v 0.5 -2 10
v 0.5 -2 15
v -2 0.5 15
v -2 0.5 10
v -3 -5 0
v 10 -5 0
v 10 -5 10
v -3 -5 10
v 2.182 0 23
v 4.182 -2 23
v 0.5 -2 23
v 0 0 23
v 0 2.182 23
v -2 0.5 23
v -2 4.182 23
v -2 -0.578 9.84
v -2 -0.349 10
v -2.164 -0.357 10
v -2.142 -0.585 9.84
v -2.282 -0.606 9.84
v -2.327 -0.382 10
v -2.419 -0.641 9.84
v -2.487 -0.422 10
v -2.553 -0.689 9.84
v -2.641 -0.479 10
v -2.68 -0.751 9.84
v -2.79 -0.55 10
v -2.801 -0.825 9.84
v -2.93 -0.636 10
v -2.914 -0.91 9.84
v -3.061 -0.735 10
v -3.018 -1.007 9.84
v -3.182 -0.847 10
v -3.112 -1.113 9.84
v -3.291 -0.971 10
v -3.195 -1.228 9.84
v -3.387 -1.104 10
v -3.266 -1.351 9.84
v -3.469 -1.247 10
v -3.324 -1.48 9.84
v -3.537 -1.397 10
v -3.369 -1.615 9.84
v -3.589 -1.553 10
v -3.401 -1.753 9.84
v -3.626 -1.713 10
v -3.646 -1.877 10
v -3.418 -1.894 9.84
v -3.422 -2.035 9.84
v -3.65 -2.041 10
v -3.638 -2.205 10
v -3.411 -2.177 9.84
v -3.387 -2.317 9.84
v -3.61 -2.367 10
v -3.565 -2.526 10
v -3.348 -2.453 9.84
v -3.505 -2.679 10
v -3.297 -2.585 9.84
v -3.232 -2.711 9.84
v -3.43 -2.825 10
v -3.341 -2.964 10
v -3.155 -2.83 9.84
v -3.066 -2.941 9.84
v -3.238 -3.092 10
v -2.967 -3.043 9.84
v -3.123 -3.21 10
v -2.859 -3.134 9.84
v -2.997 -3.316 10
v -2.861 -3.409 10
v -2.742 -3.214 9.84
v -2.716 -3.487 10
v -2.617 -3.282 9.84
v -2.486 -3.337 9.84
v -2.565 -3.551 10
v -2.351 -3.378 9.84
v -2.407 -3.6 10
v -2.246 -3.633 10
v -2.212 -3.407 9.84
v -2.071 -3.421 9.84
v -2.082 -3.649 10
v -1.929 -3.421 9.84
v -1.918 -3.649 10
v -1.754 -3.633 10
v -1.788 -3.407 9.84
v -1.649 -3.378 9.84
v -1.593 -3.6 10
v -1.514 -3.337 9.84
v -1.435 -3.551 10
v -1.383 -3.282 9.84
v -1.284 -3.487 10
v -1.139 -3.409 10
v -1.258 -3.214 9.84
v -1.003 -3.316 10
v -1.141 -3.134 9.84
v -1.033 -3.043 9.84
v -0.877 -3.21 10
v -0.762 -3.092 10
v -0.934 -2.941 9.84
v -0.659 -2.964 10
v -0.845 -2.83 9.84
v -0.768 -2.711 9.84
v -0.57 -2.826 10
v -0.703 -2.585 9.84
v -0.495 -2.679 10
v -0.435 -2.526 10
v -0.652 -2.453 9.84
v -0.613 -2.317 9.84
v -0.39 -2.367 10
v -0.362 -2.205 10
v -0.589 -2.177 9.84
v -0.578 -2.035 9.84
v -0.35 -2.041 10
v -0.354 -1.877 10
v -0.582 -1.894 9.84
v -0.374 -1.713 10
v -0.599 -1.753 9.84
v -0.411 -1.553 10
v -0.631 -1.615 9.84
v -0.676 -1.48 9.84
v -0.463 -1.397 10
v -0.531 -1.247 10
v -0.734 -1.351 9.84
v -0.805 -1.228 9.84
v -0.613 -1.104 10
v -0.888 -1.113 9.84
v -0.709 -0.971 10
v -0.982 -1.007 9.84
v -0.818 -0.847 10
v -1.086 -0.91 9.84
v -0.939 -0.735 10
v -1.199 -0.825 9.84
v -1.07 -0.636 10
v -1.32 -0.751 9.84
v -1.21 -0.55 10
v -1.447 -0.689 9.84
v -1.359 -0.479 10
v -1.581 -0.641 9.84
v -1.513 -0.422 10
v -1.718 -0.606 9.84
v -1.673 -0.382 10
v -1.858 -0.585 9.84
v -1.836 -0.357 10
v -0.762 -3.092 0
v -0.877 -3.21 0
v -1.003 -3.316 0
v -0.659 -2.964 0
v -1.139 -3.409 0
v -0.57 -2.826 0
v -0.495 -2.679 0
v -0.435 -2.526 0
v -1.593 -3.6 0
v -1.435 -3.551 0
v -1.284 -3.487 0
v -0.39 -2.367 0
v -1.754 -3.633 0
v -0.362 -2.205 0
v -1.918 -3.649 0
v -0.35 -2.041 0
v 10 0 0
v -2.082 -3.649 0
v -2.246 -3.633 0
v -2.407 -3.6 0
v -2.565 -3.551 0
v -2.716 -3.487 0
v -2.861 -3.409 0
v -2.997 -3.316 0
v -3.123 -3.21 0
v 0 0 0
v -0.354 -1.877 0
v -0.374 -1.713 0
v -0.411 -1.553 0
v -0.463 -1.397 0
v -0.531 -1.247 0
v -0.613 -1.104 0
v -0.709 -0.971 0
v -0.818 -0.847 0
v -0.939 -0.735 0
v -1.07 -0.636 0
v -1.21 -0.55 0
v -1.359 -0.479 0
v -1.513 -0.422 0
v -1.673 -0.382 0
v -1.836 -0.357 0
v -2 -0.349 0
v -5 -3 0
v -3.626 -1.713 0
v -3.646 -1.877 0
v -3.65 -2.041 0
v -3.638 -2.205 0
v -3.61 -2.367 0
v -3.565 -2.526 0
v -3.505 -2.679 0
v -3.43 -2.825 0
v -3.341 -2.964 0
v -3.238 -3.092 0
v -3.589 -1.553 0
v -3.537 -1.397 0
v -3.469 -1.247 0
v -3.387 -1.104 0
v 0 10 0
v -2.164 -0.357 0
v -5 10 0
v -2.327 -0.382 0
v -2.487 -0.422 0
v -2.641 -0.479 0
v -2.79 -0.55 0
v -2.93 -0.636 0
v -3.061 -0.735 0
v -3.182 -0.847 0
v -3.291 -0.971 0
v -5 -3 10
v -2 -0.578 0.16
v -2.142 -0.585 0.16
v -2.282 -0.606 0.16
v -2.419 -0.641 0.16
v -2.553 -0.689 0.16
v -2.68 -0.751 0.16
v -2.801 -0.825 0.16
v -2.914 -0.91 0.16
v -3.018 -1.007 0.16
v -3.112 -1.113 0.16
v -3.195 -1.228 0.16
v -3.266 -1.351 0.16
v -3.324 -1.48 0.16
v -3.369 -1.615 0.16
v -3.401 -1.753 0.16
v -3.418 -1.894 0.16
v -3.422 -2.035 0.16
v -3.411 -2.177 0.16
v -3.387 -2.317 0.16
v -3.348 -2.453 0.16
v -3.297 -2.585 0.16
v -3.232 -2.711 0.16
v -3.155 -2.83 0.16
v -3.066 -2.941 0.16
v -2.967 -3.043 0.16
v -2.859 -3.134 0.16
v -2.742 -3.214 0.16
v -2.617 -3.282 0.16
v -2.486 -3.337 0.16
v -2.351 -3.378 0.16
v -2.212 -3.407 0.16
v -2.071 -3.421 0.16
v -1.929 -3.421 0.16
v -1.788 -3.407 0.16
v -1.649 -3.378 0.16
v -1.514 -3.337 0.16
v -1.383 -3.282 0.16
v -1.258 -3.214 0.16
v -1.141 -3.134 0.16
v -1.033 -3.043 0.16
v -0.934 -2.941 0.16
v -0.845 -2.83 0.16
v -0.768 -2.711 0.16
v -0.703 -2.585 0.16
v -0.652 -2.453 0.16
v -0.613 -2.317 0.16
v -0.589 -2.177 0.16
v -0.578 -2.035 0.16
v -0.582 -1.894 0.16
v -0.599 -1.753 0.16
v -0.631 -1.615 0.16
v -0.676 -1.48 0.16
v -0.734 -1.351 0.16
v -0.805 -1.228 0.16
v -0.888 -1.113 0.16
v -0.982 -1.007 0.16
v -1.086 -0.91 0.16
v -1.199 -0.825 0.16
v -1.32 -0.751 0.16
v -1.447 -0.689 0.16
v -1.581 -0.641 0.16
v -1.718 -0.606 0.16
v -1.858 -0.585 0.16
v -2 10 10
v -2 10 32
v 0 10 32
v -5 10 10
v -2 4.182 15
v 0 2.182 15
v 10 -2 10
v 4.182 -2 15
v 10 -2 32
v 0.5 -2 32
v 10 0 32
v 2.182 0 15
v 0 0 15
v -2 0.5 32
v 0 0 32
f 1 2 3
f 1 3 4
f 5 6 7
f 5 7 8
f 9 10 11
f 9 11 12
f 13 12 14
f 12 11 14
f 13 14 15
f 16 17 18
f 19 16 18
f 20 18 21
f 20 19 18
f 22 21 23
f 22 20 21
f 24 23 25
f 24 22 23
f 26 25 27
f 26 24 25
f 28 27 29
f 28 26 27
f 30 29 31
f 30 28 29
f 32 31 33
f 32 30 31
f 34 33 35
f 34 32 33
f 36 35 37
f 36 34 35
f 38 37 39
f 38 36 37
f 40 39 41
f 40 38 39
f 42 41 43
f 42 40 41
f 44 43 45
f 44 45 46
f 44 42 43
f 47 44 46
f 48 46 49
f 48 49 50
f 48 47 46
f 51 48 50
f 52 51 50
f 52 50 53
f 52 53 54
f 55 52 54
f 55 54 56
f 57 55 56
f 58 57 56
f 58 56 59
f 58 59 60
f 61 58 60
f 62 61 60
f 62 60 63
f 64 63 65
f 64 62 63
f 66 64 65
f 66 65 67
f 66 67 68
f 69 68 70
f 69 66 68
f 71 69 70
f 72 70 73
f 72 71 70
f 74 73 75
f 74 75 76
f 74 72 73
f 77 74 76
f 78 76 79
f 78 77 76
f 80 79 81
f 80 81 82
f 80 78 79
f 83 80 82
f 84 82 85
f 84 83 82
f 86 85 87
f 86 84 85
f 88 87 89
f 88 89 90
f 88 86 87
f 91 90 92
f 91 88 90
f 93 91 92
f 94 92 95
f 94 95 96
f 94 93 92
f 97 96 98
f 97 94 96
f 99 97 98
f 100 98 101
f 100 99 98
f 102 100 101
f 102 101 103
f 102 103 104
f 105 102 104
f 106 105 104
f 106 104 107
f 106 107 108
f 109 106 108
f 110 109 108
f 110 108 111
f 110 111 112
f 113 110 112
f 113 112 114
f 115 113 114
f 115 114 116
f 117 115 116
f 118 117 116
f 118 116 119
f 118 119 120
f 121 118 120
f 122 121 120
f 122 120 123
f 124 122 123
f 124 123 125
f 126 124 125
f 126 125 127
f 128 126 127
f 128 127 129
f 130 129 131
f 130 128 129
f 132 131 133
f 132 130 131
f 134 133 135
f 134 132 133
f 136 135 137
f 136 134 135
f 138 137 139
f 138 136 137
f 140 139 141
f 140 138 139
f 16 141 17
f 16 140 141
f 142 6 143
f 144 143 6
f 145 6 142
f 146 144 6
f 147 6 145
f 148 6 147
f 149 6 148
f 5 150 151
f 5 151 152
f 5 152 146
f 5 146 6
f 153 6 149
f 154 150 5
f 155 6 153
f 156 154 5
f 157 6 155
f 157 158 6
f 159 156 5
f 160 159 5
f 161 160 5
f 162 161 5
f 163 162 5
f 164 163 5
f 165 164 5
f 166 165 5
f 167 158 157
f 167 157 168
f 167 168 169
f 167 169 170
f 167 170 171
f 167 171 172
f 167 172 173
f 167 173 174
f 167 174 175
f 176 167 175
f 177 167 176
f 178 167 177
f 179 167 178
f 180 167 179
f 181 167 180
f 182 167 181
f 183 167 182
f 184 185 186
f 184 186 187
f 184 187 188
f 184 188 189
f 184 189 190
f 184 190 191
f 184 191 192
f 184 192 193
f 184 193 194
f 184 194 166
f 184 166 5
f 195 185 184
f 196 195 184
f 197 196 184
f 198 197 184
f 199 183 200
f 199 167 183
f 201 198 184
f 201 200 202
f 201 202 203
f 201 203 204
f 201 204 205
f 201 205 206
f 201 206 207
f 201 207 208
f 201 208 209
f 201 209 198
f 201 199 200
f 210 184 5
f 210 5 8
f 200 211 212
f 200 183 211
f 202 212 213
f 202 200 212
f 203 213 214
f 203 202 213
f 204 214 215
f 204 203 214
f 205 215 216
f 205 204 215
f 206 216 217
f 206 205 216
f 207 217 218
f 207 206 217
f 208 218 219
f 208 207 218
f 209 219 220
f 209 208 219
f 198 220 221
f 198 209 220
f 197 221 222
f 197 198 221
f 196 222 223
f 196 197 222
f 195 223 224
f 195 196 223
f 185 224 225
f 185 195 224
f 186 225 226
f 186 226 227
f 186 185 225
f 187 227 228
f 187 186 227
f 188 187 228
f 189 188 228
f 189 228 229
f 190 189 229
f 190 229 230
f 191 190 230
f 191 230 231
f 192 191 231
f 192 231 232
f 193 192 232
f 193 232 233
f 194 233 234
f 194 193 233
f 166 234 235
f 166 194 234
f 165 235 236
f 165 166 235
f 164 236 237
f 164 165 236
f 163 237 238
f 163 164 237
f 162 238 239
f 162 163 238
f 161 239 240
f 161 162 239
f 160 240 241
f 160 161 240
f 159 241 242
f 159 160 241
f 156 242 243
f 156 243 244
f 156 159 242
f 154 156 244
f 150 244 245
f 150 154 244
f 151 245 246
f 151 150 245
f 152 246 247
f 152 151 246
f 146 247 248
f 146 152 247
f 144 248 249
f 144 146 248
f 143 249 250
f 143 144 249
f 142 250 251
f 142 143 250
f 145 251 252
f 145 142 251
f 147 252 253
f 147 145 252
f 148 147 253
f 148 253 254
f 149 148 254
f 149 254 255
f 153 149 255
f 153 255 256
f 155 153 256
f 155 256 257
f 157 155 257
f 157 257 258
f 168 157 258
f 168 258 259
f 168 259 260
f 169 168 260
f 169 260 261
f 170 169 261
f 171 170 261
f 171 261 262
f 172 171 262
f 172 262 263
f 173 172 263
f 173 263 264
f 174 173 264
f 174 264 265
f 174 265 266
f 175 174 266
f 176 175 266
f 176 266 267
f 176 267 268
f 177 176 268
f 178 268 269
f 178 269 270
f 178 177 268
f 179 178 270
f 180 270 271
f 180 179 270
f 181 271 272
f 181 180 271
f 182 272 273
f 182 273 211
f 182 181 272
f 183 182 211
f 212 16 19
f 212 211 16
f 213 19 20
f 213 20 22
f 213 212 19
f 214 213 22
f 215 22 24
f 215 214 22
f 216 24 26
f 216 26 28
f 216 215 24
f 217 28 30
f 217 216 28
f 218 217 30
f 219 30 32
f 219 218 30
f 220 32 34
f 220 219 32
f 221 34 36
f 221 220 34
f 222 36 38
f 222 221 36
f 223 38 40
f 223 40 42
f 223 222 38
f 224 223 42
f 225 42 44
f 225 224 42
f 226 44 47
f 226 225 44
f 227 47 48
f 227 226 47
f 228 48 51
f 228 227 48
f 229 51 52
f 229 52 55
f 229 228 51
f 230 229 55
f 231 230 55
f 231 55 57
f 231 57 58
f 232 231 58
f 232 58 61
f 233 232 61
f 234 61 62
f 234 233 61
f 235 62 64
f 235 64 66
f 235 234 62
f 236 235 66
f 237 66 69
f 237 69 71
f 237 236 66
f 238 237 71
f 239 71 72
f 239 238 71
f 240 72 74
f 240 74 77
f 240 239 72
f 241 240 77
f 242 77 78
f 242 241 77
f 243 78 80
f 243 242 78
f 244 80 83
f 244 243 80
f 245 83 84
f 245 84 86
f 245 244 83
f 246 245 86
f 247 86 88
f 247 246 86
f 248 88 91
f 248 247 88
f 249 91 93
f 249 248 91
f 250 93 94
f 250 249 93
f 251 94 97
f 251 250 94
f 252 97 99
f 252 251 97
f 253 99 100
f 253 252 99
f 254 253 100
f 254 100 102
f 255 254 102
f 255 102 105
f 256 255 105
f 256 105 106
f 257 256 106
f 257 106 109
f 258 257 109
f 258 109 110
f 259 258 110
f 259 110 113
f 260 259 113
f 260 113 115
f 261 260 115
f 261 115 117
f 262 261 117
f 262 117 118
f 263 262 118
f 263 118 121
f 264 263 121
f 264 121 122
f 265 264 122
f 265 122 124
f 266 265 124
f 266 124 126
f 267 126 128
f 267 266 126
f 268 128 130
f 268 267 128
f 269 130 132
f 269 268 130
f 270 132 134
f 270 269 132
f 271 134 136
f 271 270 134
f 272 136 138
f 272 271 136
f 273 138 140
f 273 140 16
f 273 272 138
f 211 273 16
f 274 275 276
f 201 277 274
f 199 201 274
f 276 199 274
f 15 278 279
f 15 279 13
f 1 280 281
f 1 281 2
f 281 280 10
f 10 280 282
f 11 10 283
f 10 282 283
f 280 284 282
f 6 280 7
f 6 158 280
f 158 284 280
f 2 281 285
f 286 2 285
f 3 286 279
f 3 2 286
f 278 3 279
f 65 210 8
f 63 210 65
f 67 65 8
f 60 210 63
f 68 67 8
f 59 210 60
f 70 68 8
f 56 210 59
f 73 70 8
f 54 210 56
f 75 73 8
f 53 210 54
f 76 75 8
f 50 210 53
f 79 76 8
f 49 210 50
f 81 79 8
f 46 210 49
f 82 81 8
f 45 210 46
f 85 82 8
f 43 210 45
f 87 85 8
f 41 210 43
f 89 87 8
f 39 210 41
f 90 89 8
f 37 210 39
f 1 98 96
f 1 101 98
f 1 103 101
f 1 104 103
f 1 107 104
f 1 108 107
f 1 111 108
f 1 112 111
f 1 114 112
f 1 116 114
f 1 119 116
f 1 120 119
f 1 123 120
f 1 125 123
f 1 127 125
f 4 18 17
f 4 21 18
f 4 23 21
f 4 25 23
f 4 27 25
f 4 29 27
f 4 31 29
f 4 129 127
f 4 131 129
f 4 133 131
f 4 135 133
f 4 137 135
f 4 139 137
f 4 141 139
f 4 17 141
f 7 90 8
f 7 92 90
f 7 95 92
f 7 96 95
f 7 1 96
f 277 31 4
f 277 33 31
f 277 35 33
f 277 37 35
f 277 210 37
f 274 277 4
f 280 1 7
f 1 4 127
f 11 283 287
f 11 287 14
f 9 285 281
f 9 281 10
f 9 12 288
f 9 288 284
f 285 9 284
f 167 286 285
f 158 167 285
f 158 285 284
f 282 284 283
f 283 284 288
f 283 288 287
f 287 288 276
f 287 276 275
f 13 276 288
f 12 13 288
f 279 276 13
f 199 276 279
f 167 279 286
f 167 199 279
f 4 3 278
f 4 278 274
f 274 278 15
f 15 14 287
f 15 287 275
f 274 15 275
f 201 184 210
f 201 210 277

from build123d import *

# Parameters (mm, degrees)
EXTRUDE_1_DEPTH     = 32
CHAMFER_1_SIZE      = 2
CUT_EXTRUDE_1_DEPTH = 22
SKETCH_3_W          = 8
SKETCH_3_H          = 28
CUT_EXTRUDE_2_DEPTH = 7.2
CHAMFER_2_SIZE      = 2.5


with BuildPart() as part:
    # Эскиз1 → Бобышка-Вытянуть1 (new body)
    with BuildSketch(Plane.XY):
        Polygon((0, 10), (0, 0), (10, 0), (10, -5), (-5, -5), (-5, 10), align=None)
    extrude(amount=EXTRUDE_1_DEPTH)

    # Фаска1
    chamfer_1_edges = [part.edges().sort_by_distance(p)[0] for p in [
        (-5, -5, 16),
    ]]
    chamfer(chamfer_1_edges, length=CHAMFER_1_SIZE)

    # Эскиз2 → Вырез-Вытянуть1 (cut)
    with BuildSketch(Plane.XY.offset(32)):
        Polygon((-2, -2), (-2, 10), (-5, 10), (-5, -3), (-3, -5), (10, -5), (10, -2), align=None)
    extrude(amount=-CUT_EXTRUDE_1_DEPTH, mode=Mode.SUBTRACT)

    # Эскиз3 → Вырез-Вытянуть2 (cut)
    with BuildSketch(Plane(origin=(-4, -4, 0), x_dir=(0, 0, 1), z_dir=(-0.707106781, -0.707106781, 0))):
        with Locations((19, 0)):
            Rectangle(SKETCH_3_W, SKETCH_3_H)
    extrude(amount=-CUT_EXTRUDE_2_DEPTH, mode=Mode.SUBTRACT)

    # Фаска2
    chamfer_2_edges = [part.edges().sort_by_distance(p)[0] for p in [
        (-2, -2, 12.5),
        (-2, -2, 27.5),
    ]]
    chamfer(chamfer_2_edges, length=CHAMFER_2_SIZE)

    # Эскиз4 → Отверстие обработанное метчиком #4-401 (revolve, cut)
    with BuildSketch(Plane(origin=(-2, -2, 0), x_dir=(0, 1, 0), z_dir=(1, 0, 0))):
        Polygon((0, 0), (0, 10), (1.651, 10), (1.4224, 9.839932557), (1.4224, 0.160067443), (1.651, 0), align=None)
    revolve(axis=Axis((-2, -2, -6.35), (0, 0, 1)), mode=Mode.SUBTRACT)


solid = part.part
